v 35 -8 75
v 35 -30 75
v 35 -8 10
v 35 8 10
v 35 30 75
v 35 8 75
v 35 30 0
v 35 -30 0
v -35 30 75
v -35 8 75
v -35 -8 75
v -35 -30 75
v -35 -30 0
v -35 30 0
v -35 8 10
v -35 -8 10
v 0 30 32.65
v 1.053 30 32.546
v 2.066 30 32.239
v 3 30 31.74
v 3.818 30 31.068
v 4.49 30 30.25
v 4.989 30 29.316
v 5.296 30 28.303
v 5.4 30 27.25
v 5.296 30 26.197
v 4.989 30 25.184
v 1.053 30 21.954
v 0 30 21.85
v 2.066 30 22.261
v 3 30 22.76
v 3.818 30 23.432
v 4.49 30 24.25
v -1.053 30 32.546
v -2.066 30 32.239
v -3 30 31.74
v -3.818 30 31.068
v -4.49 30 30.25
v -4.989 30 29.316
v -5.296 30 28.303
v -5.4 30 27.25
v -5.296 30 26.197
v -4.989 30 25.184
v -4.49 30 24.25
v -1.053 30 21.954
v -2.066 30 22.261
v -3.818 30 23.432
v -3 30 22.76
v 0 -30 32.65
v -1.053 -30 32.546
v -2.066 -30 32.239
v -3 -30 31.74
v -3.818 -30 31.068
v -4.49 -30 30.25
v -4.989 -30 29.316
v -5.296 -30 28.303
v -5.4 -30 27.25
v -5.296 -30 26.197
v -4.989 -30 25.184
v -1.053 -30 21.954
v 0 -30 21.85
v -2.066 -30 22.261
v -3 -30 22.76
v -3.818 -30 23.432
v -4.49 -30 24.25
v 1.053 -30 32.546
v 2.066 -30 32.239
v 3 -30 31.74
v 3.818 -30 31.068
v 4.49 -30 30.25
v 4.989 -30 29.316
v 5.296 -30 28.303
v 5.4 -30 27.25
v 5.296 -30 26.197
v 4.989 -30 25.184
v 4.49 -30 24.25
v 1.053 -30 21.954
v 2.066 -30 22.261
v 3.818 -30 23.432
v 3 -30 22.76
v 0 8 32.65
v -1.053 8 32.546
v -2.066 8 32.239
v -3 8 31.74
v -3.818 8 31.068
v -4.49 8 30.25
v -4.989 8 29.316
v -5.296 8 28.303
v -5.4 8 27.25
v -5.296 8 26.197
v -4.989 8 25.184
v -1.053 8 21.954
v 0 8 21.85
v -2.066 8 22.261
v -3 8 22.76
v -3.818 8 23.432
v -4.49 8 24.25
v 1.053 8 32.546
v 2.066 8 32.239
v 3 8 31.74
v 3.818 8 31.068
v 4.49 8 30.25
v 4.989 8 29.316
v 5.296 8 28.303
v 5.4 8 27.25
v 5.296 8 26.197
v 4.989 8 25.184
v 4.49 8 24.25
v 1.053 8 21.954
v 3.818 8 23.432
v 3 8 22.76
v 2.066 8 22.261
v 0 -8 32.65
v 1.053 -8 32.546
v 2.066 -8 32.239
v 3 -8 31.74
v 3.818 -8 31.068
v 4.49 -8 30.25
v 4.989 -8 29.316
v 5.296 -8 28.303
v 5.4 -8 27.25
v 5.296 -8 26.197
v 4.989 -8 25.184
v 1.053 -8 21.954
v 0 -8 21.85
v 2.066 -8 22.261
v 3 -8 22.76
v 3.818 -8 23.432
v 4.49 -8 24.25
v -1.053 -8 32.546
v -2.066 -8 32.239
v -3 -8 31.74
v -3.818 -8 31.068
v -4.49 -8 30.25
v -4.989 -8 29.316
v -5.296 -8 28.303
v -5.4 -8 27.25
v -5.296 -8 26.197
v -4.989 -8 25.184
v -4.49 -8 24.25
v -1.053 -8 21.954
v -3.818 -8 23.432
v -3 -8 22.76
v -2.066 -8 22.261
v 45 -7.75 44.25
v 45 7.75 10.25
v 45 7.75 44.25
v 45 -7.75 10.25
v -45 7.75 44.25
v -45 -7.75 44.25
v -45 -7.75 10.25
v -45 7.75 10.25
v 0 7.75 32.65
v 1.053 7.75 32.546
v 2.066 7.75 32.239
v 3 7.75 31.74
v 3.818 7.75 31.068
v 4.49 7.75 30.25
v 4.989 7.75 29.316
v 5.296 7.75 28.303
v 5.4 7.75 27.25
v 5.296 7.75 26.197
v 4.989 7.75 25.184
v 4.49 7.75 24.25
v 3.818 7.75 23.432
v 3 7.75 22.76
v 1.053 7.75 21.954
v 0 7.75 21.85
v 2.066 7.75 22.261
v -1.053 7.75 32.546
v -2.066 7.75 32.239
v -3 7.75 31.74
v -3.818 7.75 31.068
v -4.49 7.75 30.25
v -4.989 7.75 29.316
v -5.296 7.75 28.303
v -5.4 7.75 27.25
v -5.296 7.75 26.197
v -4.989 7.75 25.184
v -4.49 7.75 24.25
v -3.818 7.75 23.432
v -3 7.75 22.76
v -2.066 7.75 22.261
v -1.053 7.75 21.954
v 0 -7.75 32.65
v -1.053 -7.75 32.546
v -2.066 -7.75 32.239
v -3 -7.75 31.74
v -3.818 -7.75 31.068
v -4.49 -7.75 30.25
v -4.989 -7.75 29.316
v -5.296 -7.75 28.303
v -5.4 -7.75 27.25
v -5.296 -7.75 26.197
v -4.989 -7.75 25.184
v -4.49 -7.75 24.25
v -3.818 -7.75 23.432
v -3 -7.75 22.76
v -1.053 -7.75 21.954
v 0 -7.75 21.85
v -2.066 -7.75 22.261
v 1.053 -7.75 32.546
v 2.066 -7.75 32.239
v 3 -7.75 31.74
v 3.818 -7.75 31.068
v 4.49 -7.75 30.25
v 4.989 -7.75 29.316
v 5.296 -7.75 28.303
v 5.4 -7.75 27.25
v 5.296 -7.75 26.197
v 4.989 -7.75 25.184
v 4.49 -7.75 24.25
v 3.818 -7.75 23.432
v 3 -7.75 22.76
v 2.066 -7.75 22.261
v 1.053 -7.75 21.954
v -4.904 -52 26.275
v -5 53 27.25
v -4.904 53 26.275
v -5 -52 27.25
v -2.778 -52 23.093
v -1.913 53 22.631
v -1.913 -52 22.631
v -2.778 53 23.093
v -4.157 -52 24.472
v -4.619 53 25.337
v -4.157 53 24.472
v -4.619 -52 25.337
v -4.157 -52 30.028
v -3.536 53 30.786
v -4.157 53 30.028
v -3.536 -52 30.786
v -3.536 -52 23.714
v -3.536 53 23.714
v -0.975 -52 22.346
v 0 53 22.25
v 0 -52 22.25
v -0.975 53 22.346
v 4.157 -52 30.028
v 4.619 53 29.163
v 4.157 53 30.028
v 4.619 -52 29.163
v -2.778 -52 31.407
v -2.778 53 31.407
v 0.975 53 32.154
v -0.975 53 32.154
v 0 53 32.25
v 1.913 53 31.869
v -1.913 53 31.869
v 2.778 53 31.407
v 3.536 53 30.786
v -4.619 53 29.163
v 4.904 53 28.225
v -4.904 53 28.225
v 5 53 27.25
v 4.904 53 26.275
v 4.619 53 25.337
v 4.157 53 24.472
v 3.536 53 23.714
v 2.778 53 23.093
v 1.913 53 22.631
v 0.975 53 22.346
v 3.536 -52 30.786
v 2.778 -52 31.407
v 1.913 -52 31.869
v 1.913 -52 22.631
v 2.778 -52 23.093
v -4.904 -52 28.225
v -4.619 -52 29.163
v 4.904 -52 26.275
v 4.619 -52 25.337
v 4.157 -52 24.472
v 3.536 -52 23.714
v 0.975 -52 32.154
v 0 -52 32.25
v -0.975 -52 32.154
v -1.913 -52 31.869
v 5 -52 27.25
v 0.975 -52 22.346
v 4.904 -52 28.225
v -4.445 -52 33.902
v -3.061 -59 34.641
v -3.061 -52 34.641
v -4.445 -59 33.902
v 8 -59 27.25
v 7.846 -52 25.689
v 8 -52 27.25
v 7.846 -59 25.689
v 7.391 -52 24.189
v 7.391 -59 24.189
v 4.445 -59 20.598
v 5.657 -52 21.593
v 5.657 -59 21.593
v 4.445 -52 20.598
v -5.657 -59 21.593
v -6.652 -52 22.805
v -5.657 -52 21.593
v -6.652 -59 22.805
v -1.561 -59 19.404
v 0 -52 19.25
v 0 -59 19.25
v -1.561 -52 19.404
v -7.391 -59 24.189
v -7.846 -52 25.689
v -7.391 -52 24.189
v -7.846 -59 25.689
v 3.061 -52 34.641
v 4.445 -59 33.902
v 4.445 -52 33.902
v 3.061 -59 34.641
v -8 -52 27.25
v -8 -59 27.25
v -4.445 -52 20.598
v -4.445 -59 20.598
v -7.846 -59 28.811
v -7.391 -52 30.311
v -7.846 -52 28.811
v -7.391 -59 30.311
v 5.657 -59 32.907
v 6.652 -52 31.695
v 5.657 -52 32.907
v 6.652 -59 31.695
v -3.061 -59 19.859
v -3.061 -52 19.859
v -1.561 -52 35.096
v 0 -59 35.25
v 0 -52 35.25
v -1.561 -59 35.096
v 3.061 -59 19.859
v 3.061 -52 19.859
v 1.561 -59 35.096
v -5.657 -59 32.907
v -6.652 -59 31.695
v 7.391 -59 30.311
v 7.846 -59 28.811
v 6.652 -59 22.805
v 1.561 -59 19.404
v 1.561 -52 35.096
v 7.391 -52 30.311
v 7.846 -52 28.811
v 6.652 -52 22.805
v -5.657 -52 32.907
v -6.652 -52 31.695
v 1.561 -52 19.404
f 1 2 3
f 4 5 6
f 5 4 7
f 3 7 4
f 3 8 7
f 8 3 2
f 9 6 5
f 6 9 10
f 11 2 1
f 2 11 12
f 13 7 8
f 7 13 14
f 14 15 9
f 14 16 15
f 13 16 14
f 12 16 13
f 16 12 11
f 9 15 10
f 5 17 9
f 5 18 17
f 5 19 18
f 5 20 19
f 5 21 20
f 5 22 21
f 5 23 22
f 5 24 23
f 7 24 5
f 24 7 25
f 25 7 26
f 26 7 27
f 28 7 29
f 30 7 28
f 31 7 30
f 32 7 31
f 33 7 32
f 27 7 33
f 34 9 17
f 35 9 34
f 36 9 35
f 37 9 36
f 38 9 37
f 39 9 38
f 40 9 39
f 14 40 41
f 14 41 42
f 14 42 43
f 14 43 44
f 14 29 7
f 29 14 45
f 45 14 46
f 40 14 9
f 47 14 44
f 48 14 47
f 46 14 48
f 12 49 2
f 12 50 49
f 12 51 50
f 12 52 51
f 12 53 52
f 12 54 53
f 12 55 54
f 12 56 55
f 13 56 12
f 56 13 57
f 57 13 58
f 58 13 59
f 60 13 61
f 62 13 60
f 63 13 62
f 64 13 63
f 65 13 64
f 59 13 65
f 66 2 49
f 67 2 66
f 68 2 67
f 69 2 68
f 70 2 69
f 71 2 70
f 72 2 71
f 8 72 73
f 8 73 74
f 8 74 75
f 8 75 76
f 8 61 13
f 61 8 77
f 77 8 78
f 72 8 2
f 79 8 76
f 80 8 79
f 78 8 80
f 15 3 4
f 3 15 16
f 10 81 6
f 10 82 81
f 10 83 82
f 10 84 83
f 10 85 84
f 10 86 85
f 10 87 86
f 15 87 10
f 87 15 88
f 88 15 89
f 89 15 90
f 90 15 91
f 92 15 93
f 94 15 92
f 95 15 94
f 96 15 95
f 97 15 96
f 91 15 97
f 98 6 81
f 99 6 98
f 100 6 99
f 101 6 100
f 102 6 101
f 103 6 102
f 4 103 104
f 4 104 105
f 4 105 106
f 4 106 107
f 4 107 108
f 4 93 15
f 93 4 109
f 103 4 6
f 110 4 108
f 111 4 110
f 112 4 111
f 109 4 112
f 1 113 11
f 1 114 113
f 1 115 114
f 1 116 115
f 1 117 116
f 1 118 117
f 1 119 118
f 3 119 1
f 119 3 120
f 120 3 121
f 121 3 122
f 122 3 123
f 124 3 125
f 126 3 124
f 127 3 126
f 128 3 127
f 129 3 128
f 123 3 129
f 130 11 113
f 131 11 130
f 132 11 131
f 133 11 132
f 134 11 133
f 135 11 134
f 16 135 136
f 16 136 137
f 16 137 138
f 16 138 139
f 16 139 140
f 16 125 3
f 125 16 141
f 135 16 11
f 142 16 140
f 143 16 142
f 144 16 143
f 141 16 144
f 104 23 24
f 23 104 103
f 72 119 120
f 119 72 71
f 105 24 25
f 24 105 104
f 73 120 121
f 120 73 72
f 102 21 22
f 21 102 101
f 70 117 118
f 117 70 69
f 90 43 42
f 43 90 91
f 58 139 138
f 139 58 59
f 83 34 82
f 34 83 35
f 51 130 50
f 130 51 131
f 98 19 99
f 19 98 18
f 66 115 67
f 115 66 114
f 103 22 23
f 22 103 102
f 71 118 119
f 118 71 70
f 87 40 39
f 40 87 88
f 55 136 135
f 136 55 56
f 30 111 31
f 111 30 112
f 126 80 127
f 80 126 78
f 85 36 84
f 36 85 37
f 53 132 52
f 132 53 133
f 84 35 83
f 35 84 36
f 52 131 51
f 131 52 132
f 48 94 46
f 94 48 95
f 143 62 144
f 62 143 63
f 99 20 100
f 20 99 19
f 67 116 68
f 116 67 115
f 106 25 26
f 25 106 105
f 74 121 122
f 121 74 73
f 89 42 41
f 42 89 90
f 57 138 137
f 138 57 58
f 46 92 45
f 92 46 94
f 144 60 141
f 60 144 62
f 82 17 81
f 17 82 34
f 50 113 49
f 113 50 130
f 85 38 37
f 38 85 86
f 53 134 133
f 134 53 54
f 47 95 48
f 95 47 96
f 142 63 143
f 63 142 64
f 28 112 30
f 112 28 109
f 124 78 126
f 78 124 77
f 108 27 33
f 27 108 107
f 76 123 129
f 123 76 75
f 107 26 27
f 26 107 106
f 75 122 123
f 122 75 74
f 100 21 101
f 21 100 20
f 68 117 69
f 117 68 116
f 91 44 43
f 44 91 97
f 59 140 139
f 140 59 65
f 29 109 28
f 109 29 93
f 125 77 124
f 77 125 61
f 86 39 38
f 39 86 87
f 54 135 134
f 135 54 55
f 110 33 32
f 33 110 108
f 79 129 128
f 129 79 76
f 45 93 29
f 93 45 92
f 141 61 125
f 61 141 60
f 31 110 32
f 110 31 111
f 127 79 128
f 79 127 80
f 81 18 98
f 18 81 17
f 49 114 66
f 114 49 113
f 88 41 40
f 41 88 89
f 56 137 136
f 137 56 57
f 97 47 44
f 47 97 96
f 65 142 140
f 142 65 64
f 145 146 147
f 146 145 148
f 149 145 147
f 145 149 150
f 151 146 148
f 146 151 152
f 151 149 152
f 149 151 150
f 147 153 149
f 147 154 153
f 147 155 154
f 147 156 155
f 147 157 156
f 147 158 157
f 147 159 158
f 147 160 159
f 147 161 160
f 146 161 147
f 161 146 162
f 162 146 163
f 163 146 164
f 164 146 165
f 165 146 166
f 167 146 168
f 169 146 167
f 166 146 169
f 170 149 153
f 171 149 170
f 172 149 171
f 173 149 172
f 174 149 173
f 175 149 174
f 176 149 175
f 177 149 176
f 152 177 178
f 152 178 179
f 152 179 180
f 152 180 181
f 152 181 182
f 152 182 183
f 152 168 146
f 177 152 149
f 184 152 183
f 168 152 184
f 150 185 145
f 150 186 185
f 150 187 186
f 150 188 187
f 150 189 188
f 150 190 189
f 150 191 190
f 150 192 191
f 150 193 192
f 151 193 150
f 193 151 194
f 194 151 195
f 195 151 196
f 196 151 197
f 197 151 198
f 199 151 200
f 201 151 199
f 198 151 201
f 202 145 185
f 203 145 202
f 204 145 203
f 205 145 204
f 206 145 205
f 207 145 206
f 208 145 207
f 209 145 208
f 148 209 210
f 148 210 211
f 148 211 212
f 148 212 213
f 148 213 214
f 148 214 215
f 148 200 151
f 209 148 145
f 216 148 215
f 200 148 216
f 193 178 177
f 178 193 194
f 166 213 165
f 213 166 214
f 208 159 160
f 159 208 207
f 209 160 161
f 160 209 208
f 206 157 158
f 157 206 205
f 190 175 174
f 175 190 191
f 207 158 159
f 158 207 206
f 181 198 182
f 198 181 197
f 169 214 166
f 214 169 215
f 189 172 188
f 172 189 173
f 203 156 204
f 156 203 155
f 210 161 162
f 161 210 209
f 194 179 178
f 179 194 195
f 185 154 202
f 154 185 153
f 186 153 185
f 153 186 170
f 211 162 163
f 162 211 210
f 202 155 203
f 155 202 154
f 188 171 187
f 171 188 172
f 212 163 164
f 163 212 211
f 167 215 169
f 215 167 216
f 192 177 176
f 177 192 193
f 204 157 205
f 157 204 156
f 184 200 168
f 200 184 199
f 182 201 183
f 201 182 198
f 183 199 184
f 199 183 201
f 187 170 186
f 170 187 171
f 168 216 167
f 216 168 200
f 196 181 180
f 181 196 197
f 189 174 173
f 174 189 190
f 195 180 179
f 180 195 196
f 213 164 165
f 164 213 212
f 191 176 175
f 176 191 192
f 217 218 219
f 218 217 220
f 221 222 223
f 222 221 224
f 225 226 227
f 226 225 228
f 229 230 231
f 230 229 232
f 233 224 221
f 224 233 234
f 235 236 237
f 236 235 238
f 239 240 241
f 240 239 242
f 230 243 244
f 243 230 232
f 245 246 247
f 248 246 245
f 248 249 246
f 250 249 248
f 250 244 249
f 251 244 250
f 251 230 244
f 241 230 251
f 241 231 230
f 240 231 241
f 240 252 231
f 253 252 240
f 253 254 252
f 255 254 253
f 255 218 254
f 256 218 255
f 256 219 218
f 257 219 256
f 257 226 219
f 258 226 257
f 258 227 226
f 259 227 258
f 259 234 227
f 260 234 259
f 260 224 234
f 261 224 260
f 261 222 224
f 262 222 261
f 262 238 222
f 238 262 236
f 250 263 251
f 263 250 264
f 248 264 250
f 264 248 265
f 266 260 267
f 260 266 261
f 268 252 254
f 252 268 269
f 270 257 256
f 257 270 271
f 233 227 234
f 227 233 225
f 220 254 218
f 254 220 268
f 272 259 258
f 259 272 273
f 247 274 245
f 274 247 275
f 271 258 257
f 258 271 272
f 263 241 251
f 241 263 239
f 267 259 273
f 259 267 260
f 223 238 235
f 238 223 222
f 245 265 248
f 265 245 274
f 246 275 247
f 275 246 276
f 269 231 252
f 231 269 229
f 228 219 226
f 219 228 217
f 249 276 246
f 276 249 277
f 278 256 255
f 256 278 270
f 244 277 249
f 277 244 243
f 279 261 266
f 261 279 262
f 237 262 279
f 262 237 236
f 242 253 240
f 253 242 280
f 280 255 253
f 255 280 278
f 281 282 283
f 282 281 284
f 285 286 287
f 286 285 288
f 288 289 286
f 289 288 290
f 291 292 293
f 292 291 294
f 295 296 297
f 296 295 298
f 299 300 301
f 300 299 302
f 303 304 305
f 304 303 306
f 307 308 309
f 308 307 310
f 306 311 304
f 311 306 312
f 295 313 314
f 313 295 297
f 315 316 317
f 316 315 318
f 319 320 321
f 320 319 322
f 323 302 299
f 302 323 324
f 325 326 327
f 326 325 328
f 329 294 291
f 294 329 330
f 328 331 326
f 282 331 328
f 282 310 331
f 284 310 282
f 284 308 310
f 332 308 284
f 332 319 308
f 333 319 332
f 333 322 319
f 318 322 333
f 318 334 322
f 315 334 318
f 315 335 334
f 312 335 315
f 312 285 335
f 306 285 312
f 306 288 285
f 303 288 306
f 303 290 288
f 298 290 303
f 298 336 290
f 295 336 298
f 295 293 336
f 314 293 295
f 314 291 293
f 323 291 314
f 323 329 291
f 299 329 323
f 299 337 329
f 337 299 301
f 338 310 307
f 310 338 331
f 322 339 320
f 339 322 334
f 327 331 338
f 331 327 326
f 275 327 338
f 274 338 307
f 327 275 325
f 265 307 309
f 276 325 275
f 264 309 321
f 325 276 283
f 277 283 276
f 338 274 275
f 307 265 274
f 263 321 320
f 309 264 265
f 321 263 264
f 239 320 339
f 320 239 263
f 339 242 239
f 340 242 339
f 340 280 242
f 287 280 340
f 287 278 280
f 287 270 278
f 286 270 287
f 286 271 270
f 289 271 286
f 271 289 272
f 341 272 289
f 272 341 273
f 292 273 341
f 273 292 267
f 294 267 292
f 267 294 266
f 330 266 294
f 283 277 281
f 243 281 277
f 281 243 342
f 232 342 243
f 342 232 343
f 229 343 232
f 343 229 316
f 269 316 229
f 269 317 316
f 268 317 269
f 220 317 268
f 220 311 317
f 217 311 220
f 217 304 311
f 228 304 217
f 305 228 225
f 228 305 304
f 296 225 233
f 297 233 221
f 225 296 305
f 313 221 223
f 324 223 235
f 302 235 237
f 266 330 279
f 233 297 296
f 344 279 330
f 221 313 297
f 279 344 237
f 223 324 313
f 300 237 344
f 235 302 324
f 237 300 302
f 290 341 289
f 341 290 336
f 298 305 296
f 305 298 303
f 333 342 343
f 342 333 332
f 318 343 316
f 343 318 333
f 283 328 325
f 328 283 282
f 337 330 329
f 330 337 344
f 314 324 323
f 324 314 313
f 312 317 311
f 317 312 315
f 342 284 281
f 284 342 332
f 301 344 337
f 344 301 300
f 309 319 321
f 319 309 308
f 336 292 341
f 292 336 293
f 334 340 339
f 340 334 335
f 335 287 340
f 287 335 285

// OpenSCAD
$fn = 32;

// ------------------------------------------------------------------------
// Clevis joint: 70 mm clevis, pin d10
// Every part is its own module, assembly() places them once.
// ------------------------------------------------------------------------

// --- part 1 ---
module clevis() {
  difference() {
    translate([-35, -30, 0]) cube([70, 60, 75]);
    translate([-36, -8, 10]) cube([72, 16, 66]);
    translate([0, 0, 27.25]) rotate([90, 0, 0]) cylinder(h = 62, d = 10.8, center = true);
  }
}

// --- part 2 ---
module eye() {
  difference() {
    translate([-45, -7.75, 0]) cube([90, 15.5, 34]);
    translate([0, 0, 17]) rotate([90, 0, 0]) cylinder(h = 17.5, d = 10.8, center = true);
  }
}

// --- part 3 ---
module pin() {
  rotate([0, 90, 0]) cylinder(h = 106, d = 10, center = true);
  translate([-59, 0, 0]) rotate([0, 90, 0]) cylinder(h = 7, d = 16);
}

// --- assembly ---
module assembly() {
  translate([0, 0, 0]) rotate([0, 0, 0]) clevis();
  translate([0, 0, 10.25]) rotate([0, 0, 0]) eye();
  translate([0, 0, 27.25]) rotate([0, 0, 90]) pin();
}

assembly();
